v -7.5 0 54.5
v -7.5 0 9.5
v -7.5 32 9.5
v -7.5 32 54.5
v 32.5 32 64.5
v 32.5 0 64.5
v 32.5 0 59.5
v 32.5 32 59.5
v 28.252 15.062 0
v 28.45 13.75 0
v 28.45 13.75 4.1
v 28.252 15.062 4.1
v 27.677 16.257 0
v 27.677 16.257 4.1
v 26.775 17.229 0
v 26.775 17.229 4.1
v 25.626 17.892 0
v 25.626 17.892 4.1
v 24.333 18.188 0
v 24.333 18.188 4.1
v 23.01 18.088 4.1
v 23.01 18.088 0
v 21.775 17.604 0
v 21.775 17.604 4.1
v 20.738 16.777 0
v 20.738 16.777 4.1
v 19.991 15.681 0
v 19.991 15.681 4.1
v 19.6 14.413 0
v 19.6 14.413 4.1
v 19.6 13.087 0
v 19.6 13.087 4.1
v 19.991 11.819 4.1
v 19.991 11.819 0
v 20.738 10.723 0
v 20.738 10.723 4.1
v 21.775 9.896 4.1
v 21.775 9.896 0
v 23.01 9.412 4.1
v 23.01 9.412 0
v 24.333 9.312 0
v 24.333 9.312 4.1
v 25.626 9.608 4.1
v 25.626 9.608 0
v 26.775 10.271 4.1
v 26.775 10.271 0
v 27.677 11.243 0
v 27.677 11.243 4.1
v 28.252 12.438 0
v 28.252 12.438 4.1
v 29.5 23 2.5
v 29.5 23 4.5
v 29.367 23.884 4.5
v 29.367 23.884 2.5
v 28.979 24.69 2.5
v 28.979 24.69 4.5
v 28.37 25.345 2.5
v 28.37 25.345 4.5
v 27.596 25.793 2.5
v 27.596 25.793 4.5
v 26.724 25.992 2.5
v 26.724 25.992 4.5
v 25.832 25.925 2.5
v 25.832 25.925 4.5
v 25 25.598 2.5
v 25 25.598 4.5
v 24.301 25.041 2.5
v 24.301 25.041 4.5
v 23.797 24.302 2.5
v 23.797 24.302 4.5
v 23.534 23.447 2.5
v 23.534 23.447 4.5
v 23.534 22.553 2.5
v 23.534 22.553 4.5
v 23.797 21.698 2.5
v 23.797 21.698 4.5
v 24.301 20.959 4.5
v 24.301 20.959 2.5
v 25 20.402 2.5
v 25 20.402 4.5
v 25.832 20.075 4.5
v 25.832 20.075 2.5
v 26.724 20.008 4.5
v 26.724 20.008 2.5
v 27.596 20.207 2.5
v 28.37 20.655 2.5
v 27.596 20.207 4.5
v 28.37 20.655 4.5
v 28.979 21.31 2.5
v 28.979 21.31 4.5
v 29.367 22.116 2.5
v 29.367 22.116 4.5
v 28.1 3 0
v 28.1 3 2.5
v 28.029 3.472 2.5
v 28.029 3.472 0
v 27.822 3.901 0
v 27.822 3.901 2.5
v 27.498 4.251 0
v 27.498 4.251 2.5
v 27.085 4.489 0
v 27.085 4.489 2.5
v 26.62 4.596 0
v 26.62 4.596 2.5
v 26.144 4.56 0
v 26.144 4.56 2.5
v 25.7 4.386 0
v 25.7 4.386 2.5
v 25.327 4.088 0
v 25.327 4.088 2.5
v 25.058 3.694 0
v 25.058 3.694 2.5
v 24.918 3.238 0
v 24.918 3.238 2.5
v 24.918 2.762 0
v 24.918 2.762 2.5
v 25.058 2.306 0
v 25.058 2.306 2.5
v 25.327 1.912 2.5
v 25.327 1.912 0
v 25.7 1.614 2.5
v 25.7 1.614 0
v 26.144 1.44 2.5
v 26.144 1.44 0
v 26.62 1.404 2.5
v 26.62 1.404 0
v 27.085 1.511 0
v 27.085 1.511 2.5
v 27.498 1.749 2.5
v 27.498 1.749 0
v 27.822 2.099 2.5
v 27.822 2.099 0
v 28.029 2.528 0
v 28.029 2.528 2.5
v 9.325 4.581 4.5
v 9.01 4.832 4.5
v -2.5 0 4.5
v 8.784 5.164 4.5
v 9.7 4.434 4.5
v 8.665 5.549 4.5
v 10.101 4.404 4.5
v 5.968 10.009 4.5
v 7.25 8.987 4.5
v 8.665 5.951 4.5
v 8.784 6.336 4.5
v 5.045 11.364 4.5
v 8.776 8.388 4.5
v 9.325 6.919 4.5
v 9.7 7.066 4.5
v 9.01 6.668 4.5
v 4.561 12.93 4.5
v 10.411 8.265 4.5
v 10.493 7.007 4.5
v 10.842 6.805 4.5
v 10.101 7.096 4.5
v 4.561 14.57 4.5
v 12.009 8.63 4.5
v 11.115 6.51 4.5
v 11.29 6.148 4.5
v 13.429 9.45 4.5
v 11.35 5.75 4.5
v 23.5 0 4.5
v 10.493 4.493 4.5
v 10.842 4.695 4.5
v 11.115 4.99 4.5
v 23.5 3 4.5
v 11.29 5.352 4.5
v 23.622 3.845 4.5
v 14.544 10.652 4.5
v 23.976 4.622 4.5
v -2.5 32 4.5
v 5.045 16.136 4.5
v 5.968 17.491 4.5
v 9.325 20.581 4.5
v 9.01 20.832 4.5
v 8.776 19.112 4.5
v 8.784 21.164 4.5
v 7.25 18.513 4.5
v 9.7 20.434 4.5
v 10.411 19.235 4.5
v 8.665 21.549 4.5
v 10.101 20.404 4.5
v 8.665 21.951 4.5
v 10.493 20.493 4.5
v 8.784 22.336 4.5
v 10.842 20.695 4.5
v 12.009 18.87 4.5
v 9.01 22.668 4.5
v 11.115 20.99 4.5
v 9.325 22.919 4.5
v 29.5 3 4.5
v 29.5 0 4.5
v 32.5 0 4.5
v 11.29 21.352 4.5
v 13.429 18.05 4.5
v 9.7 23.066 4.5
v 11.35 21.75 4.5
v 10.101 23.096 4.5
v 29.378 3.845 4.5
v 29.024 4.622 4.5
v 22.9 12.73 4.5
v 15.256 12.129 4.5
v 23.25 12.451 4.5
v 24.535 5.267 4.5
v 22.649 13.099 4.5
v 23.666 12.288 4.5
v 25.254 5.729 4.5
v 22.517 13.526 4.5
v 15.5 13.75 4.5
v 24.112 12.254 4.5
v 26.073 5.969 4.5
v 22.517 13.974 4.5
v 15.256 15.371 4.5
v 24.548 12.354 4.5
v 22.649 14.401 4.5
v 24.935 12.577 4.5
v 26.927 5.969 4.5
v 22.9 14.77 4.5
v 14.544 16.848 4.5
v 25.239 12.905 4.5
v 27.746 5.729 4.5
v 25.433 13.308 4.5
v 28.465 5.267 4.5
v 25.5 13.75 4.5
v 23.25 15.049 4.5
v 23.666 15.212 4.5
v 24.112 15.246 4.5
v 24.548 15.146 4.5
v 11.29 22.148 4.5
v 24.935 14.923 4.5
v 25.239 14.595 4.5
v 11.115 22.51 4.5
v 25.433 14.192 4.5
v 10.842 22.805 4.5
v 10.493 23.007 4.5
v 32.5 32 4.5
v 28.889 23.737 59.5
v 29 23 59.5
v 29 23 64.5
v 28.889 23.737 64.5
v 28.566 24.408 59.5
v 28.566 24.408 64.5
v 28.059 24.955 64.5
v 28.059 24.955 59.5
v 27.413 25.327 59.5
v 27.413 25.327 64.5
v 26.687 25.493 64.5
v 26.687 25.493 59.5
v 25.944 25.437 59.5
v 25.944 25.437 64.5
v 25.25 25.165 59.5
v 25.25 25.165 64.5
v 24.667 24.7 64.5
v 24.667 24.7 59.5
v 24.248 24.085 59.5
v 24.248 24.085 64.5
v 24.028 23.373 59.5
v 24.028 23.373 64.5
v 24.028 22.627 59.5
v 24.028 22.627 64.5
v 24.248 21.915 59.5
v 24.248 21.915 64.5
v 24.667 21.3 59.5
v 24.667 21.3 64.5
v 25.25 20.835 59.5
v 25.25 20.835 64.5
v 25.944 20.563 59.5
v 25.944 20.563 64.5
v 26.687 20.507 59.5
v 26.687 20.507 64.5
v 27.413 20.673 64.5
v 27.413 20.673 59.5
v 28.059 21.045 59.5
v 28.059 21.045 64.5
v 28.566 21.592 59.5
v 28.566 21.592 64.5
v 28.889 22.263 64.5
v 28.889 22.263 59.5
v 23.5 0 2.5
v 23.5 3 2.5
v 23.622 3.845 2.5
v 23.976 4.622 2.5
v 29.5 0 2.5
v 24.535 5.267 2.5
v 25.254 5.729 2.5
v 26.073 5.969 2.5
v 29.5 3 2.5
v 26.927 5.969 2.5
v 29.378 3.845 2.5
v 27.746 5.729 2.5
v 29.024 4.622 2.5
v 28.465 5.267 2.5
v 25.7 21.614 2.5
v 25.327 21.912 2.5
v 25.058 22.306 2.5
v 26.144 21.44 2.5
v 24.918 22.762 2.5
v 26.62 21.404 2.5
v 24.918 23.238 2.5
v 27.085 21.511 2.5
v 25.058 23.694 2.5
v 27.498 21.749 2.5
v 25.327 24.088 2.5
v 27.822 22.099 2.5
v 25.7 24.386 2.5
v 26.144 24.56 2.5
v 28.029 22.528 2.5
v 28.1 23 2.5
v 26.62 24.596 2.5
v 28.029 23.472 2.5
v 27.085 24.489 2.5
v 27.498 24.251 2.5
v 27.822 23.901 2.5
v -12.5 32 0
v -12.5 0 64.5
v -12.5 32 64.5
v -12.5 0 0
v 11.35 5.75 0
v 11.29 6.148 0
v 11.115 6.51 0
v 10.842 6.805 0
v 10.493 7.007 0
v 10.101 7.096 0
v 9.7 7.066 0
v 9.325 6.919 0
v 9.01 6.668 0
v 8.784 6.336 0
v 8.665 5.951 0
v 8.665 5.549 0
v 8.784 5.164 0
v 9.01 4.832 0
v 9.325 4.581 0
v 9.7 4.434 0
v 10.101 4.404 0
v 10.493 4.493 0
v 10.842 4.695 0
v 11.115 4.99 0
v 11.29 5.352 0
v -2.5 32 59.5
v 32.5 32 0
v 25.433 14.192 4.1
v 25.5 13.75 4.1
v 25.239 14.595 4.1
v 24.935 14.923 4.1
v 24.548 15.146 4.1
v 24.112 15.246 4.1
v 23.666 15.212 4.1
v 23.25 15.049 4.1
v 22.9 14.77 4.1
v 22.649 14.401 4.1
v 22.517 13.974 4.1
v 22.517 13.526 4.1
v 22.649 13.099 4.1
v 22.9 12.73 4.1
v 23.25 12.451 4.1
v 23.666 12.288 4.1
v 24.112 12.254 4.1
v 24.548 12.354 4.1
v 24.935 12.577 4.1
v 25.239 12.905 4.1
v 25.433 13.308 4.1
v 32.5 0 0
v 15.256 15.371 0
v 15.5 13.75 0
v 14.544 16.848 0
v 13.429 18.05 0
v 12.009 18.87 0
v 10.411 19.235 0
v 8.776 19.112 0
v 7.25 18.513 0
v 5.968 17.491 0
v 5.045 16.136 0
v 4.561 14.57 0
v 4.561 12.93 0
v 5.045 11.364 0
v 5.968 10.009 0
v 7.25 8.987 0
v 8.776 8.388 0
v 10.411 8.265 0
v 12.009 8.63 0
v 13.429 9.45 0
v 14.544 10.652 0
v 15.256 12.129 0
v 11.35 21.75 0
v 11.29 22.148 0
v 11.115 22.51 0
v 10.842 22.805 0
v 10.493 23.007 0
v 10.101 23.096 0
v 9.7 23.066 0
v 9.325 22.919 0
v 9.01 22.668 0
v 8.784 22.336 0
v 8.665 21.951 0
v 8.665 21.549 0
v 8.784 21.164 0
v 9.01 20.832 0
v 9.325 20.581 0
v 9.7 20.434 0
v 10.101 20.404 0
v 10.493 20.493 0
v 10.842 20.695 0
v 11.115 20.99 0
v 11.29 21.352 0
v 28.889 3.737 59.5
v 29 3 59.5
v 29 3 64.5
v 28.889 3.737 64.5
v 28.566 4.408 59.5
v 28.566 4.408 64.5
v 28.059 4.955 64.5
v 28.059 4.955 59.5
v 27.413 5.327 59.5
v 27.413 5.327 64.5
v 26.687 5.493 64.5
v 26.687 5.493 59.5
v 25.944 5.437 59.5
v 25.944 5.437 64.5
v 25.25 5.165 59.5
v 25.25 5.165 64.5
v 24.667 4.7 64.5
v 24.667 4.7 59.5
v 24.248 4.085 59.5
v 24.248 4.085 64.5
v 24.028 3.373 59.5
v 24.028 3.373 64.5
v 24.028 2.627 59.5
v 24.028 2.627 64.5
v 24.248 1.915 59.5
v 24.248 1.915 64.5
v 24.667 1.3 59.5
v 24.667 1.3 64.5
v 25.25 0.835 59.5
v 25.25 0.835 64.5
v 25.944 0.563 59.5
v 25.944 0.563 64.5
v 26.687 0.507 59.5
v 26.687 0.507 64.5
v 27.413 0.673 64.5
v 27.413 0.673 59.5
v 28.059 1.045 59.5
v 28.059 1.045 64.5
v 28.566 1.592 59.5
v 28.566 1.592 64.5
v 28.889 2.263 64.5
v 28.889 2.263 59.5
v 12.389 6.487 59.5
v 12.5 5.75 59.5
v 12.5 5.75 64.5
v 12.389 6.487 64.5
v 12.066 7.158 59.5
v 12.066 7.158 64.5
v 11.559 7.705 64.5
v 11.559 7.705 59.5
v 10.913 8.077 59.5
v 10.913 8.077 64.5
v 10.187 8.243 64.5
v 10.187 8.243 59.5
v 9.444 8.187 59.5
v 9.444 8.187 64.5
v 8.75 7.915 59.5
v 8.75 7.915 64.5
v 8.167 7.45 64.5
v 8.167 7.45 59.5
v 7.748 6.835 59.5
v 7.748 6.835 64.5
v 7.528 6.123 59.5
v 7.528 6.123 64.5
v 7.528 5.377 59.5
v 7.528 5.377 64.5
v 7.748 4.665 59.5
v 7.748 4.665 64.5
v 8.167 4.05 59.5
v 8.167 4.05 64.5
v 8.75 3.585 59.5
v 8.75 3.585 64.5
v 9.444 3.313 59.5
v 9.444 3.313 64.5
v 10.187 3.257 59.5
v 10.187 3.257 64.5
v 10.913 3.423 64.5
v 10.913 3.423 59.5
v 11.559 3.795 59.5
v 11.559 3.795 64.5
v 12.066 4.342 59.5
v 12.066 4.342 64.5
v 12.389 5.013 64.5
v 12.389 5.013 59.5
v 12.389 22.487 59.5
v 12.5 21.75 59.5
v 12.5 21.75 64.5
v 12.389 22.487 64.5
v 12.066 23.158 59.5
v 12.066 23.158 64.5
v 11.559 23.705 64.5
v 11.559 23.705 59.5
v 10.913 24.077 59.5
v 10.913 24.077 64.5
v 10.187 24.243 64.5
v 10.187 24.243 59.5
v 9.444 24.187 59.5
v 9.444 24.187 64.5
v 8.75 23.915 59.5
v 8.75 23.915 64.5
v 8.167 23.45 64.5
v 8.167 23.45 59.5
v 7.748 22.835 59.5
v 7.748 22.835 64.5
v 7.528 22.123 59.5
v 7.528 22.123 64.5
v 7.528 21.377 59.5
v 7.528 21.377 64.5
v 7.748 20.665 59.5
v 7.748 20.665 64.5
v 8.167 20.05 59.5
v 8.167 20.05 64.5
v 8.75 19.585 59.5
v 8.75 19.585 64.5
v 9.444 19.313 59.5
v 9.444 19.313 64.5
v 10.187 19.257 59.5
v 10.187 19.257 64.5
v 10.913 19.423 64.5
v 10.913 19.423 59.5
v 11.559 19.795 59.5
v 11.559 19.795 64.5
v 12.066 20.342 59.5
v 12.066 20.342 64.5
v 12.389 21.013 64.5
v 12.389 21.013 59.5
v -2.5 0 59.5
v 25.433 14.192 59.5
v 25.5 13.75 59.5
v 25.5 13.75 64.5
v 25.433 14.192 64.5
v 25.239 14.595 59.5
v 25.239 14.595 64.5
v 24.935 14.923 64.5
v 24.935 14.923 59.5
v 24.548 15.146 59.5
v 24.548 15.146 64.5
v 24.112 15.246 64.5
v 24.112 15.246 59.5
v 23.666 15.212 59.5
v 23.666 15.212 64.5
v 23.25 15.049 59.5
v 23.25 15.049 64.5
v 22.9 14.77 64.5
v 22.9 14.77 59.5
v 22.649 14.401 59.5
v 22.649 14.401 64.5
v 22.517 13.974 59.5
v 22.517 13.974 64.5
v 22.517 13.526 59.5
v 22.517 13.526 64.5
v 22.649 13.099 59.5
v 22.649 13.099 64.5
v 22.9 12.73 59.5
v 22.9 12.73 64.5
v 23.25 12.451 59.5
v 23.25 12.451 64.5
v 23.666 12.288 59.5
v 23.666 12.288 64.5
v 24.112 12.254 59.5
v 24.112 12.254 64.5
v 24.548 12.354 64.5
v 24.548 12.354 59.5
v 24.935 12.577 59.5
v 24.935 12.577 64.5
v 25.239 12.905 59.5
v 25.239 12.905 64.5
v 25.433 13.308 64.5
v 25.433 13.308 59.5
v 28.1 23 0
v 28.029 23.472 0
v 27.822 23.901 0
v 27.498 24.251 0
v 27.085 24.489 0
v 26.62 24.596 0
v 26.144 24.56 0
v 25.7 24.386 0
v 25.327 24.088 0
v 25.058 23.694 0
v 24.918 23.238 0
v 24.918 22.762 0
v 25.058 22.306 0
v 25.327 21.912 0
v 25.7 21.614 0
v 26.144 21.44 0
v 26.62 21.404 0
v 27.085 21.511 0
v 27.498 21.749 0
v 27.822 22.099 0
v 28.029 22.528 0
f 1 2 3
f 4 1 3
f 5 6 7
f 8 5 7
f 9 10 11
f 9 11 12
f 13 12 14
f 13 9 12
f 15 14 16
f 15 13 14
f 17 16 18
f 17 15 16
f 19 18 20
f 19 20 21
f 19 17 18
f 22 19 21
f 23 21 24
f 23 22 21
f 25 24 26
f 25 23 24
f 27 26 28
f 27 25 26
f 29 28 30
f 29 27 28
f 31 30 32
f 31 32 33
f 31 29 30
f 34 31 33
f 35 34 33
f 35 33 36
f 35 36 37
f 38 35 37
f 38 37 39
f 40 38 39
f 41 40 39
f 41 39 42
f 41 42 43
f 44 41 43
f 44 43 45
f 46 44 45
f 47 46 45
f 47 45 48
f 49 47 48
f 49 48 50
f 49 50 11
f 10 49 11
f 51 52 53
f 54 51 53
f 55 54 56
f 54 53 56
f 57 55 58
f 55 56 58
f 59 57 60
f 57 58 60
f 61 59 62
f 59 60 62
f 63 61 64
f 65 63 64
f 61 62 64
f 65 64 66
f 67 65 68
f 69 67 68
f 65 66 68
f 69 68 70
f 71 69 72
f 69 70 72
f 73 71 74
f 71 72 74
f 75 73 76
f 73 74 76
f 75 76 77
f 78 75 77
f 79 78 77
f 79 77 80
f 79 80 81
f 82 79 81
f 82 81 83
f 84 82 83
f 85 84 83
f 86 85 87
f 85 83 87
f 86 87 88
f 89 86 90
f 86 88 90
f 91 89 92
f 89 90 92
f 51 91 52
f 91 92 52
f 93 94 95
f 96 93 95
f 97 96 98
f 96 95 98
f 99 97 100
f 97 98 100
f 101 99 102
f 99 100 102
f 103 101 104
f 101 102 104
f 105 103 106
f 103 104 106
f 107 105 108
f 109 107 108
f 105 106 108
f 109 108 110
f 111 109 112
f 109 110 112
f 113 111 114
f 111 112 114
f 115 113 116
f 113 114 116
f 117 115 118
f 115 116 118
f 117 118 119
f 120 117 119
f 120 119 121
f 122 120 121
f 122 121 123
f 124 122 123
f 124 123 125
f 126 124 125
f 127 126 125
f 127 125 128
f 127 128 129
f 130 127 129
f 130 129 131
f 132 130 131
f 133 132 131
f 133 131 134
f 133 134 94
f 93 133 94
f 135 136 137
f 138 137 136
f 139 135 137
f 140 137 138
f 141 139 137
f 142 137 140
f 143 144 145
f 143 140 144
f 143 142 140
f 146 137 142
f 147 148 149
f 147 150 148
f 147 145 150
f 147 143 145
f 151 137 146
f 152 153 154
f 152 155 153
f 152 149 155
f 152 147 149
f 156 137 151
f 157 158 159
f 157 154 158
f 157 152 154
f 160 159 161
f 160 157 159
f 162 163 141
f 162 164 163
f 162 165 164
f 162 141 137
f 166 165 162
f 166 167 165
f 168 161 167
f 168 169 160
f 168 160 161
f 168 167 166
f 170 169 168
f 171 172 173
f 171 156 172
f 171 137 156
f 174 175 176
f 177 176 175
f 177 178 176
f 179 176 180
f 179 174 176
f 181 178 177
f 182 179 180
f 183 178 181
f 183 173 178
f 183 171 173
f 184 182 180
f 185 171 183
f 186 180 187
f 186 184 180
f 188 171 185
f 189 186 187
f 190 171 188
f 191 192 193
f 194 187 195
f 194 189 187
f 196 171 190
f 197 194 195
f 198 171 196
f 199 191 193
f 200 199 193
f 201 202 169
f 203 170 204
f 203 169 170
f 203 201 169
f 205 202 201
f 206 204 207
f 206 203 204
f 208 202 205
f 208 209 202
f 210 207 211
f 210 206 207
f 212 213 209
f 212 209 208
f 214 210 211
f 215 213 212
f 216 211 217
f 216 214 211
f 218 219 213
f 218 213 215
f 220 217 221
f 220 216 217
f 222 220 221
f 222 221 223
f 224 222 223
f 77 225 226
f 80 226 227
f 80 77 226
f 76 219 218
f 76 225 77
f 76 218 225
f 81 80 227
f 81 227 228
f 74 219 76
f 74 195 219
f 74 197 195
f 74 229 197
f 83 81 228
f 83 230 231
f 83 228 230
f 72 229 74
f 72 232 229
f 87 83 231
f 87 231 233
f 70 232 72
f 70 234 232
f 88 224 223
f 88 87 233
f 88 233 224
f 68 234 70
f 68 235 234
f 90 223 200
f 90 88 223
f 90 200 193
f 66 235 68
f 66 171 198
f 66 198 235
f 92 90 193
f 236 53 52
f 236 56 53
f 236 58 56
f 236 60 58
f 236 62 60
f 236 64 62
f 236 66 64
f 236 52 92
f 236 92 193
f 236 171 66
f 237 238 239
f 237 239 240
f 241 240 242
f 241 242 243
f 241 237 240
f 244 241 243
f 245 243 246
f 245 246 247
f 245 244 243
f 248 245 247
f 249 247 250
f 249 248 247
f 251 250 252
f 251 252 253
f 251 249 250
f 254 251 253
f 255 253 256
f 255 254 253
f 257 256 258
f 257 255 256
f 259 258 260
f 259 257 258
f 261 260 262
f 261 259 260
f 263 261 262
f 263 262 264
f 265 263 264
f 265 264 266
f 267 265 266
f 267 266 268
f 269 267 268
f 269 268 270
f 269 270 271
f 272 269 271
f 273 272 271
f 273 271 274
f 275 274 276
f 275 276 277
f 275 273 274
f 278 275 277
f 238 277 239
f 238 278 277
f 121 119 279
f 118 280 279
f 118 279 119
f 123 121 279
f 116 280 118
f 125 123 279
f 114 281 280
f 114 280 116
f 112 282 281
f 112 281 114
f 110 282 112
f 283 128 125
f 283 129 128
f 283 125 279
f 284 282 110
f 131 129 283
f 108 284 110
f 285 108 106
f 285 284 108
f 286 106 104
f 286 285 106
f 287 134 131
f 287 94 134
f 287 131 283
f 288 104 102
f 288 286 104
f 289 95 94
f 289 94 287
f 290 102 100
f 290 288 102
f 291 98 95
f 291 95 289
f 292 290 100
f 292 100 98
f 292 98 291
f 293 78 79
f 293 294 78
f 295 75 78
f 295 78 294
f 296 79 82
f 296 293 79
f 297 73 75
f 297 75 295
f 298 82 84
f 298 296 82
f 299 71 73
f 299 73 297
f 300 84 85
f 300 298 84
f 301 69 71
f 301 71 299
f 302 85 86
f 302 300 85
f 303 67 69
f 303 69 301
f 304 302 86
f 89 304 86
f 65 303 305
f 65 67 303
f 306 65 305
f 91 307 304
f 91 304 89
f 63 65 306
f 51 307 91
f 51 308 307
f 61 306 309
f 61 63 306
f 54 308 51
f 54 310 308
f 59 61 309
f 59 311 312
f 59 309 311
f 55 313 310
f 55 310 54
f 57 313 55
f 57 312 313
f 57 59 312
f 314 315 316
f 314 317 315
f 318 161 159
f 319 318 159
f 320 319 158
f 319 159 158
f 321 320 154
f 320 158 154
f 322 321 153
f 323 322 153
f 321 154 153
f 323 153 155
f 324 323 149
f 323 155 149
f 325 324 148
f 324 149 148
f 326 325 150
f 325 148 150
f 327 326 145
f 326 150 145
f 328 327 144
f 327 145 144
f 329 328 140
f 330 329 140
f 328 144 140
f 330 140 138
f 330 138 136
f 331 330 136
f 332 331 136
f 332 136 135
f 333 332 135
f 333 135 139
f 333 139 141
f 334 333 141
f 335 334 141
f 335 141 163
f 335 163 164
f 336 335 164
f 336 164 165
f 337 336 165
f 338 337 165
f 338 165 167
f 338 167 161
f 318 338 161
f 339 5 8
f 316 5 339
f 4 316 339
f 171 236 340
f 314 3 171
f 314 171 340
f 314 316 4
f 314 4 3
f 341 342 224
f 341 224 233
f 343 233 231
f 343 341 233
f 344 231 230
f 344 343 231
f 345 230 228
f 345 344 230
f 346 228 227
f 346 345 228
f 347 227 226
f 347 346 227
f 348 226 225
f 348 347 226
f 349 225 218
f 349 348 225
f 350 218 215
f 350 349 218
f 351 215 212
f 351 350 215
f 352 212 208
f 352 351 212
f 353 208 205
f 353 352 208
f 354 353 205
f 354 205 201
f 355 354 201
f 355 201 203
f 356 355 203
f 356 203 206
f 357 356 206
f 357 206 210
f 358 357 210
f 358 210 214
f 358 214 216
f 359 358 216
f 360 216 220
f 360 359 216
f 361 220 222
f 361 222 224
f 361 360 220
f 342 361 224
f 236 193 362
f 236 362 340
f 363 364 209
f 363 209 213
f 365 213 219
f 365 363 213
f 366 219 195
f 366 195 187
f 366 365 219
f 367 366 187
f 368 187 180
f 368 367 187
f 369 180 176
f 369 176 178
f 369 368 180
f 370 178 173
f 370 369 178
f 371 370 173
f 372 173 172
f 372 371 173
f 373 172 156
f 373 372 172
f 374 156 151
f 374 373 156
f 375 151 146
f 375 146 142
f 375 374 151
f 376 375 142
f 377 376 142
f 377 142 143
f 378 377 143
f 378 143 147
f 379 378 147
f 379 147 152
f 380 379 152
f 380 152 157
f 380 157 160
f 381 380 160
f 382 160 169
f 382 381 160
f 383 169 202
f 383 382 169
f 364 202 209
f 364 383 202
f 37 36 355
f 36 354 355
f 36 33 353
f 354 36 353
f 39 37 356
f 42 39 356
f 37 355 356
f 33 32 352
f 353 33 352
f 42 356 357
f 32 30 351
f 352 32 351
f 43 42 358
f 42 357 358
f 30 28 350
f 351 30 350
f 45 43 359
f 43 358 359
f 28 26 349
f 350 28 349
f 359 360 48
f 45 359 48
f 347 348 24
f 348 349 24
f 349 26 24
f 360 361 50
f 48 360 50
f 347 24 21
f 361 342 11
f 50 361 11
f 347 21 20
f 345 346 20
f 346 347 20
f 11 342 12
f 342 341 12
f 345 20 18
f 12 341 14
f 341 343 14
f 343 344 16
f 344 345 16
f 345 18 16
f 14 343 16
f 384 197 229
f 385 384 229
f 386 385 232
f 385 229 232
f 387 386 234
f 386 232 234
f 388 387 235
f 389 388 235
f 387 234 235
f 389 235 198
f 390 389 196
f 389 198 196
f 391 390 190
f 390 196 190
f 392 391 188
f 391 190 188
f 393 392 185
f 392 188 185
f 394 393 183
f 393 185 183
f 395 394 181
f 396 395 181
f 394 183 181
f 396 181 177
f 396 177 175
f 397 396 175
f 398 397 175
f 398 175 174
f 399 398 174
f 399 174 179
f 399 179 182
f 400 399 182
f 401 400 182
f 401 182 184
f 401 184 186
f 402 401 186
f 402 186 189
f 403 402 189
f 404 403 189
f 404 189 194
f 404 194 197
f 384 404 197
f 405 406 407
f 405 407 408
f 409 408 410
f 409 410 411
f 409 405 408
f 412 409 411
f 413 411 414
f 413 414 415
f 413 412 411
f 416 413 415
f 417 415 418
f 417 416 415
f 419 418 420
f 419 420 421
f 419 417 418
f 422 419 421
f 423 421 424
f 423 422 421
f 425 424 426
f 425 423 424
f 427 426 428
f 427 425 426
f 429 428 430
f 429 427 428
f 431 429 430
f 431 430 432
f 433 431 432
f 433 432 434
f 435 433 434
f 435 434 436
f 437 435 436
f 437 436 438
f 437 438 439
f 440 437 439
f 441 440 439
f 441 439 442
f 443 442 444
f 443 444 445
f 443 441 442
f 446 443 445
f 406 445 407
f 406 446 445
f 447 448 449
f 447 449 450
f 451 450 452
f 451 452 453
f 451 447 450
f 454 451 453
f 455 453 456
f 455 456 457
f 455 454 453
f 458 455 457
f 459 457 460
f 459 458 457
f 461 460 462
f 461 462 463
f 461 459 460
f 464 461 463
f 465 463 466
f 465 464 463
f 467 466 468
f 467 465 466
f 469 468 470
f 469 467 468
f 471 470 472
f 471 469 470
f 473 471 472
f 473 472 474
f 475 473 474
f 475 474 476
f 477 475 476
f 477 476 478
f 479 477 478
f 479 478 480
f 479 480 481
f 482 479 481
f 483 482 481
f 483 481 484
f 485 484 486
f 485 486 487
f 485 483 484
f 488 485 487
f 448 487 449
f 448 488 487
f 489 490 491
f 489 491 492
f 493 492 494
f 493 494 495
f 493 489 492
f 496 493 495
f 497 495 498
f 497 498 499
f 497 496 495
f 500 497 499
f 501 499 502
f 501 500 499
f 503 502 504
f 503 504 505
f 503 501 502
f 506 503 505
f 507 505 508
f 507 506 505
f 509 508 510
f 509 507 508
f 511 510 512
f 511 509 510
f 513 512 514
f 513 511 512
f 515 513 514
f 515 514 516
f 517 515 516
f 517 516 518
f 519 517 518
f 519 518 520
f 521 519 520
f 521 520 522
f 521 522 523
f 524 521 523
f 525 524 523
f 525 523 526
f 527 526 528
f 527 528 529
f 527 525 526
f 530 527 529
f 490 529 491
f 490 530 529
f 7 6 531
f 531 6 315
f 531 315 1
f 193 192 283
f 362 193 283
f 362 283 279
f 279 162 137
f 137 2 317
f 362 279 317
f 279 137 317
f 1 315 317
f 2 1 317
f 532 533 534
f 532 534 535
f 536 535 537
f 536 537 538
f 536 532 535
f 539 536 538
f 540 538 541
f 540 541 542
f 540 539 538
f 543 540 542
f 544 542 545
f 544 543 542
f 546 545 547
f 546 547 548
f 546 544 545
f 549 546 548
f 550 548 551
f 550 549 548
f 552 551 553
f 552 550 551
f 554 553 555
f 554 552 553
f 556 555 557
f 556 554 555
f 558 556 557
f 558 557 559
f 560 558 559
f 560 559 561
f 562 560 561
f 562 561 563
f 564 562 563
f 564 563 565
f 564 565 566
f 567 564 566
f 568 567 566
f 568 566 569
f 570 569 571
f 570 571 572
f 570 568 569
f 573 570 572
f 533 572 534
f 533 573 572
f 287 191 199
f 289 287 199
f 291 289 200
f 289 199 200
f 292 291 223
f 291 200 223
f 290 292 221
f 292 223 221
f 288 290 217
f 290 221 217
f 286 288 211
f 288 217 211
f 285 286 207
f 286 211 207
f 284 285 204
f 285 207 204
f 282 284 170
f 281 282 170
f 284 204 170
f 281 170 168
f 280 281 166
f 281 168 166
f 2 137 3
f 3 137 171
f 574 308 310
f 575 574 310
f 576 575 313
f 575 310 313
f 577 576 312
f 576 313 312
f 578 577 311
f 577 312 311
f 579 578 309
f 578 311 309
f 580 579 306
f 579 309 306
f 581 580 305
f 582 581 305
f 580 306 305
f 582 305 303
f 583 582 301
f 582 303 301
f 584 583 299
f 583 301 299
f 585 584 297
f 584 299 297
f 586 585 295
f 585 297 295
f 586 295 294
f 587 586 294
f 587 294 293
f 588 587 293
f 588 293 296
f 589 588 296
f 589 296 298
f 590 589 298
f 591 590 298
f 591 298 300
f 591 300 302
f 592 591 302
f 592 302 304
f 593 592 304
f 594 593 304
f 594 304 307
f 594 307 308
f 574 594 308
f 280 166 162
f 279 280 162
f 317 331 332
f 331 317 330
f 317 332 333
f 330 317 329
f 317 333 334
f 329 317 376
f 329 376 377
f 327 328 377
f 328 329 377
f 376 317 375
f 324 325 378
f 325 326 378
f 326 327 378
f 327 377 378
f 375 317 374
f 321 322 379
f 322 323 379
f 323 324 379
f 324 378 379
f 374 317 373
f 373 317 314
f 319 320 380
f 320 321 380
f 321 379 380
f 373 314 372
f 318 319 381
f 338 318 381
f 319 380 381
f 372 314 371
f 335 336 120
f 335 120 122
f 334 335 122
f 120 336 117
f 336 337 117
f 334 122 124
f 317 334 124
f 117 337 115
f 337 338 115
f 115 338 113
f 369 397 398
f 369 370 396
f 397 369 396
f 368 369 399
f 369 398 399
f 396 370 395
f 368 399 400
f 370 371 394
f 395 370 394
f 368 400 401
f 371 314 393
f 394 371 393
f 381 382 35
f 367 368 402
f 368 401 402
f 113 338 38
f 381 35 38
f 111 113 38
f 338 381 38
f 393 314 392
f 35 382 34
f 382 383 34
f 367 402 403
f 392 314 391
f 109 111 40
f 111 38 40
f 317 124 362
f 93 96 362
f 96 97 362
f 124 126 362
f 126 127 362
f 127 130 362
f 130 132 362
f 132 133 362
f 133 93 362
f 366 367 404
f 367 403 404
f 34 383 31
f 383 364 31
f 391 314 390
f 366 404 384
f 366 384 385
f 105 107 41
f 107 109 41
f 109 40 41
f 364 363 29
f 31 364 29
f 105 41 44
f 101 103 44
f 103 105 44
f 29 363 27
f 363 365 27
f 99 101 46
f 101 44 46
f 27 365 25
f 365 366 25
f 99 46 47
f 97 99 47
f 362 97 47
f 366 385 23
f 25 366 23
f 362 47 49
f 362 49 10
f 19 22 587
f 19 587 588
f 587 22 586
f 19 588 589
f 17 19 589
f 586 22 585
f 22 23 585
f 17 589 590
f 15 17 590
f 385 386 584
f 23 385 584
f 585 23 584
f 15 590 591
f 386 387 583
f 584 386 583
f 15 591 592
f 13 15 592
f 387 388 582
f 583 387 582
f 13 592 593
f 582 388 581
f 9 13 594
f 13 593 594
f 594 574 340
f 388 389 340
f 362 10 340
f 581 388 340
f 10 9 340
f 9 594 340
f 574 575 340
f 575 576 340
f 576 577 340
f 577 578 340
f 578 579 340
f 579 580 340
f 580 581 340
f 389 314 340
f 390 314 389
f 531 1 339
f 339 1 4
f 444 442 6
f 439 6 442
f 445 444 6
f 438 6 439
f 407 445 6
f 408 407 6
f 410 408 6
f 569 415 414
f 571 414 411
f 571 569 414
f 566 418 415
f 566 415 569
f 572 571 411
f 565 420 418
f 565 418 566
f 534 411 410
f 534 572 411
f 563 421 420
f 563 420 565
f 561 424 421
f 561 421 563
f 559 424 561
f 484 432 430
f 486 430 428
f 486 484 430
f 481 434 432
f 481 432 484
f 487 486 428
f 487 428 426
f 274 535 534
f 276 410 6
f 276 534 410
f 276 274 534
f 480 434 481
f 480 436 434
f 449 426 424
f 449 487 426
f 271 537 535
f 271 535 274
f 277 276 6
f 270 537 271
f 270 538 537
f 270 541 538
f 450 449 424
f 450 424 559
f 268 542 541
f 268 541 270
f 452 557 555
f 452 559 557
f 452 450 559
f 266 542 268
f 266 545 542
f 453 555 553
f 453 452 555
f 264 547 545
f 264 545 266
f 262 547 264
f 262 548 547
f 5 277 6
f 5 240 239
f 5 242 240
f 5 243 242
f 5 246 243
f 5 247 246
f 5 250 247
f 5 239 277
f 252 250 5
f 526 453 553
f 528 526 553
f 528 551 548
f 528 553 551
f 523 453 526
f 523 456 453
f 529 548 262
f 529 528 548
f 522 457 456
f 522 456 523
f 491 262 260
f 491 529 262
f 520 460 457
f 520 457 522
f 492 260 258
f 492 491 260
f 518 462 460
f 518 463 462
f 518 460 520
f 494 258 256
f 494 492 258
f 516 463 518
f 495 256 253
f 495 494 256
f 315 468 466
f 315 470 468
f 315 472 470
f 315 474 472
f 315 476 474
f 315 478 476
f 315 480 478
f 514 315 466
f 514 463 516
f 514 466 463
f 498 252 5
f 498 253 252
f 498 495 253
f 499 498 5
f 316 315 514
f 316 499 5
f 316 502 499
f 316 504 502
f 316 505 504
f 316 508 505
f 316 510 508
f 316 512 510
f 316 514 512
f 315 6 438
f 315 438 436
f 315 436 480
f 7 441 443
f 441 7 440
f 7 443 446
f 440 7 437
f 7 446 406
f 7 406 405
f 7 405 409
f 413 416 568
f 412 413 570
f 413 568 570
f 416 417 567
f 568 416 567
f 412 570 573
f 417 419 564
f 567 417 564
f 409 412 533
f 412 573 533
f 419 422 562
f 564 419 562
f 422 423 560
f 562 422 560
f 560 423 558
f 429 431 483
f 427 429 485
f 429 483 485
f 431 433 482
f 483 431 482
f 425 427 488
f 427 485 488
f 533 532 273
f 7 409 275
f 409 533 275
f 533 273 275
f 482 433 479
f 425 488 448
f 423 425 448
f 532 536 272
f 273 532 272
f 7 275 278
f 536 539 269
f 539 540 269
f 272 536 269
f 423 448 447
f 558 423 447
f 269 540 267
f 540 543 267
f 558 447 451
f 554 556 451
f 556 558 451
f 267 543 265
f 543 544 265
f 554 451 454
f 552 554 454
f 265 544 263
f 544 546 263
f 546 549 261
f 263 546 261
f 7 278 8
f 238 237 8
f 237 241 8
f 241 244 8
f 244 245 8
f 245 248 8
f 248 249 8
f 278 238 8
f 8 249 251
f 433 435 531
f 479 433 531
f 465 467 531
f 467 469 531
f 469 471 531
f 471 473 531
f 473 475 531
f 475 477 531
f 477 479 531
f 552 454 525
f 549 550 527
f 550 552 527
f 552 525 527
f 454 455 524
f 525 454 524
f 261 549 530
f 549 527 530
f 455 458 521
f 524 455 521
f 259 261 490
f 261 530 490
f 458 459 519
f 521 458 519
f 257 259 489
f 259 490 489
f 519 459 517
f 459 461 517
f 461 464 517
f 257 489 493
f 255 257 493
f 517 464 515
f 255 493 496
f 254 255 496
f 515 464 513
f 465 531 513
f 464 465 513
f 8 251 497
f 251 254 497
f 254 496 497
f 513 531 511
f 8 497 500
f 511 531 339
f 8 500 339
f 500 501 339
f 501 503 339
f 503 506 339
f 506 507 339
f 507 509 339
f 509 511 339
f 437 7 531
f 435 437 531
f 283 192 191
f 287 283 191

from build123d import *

# Parameters (mm, degrees)
SKETCH1_R           = 5.5
SKETCH1_R_2         = 4.45
BOSS_EXTRUDE1_DEPTH = 4.5
BOSS_EXTRUDE2_START = -0.4
SKETCH2_R           = 4.45
SKETCH2_R_2         = 1.5
BOSS_EXTRUDE2_DEPTH = 0.4
SKETCH3_R           = 1.6
CUT_EXTRUDE1_DEPTH  = 10
SKETCH4_R           = 1.35
CUT_EXTRUDE2_DEPTH  = 10
SKETCH5_W           = 45
SKETCH5_H           = 4.5
BOSS_EXTRUDE3_DEPTH = 4.5
SKETCH6_R           = 3
CUT_EXTRUDE4_DEPTH  = 2
SKETCH7_W           = 5
SKETCH7_H           = 32
BOSS_EXTRUDE4_DEPTH = 60
SKETCH8_W           = 5
SKETCH8_H           = 32
BOSS_EXTRUDE5_DEPTH = 40
CUT_EXTRUDE5_START  = -5
SKETCH11_R          = 2.5
SKETCH11_R_2        = 1.5
CUT_EXTRUDE5_DEPTH  = 5
CHAMFER1_SIZE       = 5


with BuildPart() as part:
    # Sketch1 → Boss-Extrude1 (new body)
    with BuildSketch(Plane.XY):
        Polygon((0, 27.5), (32.5, 27.5), (32.5, 0), (0, 0), (-12.5, 0), (-12.5, 27.5), align=None)
        with Locations((10, 13.75)):
            Circle(SKETCH1_R, mode=Mode.SUBTRACT)
        with Locations((24, 13.75)):
            Circle(SKETCH1_R_2, mode=Mode.SUBTRACT)
    extrude(amount=BOSS_EXTRUDE1_DEPTH)

    # Sketch2 → Boss-Extrude2 (add)
    with BuildSketch(Plane.XY.offset(4.5).offset(BOSS_EXTRUDE2_START)):
        with Locations((24, 13.75)):
            Circle(SKETCH2_R)
        with Locations((24, 13.75)):
            Circle(SKETCH2_R_2, mode=Mode.SUBTRACT)
    extrude(amount=BOSS_EXTRUDE2_DEPTH)

    # Sketch3 → Cut-Extrude1 (cut)
    with BuildSketch(Plane.XY.offset(4.5)):
        with Locations((26.5, 23)):
            Circle(SKETCH3_R)
        with Locations((26.5, 3)):
            Circle(SKETCH3_R)
    extrude(amount=-CUT_EXTRUDE1_DEPTH, mode=Mode.SUBTRACT)

    # Sketch4 → Cut-Extrude2 (cut)
    with BuildSketch(Plane.XY.offset(4.5)):
        with Locations((10, 21.75)):
            Circle(SKETCH4_R)
        with Locations((10, 5.75)):
            Circle(SKETCH4_R)
    extrude(amount=-CUT_EXTRUDE2_DEPTH, mode=Mode.SUBTRACT)

    # Sketch5 → Boss-Extrude3 (add)
    with BuildSketch(Plane.XY.offset(4.5)):
        with Locations((10, 29.75)):
            Rectangle(SKETCH5_W, SKETCH5_H)
    extrude(amount=-BOSS_EXTRUDE3_DEPTH)

    # Sketch6 → Cut-Extrude4 (cut)
    with BuildSketch(Plane.XY.offset(4.5)):
        with Locations((26.5, 23)):
            Circle(SKETCH6_R)
        with BuildLine():
            Line((23.5, 3), (23.5, 0))
            Line((23.5, 0), (29.5, 0))
            Line((29.5, 0), (29.5, 3))
            ThreePointArc((29.5, 3), (26.5, 6), (23.5, 3))
        make_face()
    extrude(amount=-CUT_EXTRUDE4_DEPTH, mode=Mode.SUBTRACT)

    # Sketch7 → Boss-Extrude4 (add)
    with BuildSketch(Plane.XY.offset(4.5)):
        with Locations((-10, 16)):
            Rectangle(SKETCH7_W, SKETCH7_H)
    extrude(amount=BOSS_EXTRUDE4_DEPTH)

    # Sketch8 → Boss-Extrude5 (add)
    with BuildSketch(Plane(origin=(-7.5, 0, 0), x_dir=(0, 0, -1), z_dir=(1, 0, 0))):
        with Locations((-62, 16)):
            Rectangle(SKETCH8_W, SKETCH8_H)
    extrude(amount=BOSS_EXTRUDE5_DEPTH)

    # Sketch11 → Cut-Extrude5 (cut)
    with BuildSketch(Plane.XY.offset(64.5).offset(CUT_EXTRUDE5_START)):
        with Locations((10, 21.75)):
            Circle(SKETCH11_R)
        with Locations((26.5, 23)):
            Circle(SKETCH11_R)
        with Locations((26.5, 3)):
            Circle(SKETCH11_R)
        with Locations((10, 5.75)):
            Circle(SKETCH11_R)
        with Locations((24, 13.75)):
            Circle(SKETCH11_R_2)
    extrude(amount=CUT_EXTRUDE5_DEPTH, mode=Mode.SUBTRACT)

    # Chamfer1
    chamfer1_edges = [part.edges().sort_by_distance(p)[0] for p in [
        (-7.5, 16, 59.5),
        (-7.5, 16, 4.5),
    ]]
    chamfer(chamfer1_edges, length=CHAMFER1_SIZE)


solid = part.part
